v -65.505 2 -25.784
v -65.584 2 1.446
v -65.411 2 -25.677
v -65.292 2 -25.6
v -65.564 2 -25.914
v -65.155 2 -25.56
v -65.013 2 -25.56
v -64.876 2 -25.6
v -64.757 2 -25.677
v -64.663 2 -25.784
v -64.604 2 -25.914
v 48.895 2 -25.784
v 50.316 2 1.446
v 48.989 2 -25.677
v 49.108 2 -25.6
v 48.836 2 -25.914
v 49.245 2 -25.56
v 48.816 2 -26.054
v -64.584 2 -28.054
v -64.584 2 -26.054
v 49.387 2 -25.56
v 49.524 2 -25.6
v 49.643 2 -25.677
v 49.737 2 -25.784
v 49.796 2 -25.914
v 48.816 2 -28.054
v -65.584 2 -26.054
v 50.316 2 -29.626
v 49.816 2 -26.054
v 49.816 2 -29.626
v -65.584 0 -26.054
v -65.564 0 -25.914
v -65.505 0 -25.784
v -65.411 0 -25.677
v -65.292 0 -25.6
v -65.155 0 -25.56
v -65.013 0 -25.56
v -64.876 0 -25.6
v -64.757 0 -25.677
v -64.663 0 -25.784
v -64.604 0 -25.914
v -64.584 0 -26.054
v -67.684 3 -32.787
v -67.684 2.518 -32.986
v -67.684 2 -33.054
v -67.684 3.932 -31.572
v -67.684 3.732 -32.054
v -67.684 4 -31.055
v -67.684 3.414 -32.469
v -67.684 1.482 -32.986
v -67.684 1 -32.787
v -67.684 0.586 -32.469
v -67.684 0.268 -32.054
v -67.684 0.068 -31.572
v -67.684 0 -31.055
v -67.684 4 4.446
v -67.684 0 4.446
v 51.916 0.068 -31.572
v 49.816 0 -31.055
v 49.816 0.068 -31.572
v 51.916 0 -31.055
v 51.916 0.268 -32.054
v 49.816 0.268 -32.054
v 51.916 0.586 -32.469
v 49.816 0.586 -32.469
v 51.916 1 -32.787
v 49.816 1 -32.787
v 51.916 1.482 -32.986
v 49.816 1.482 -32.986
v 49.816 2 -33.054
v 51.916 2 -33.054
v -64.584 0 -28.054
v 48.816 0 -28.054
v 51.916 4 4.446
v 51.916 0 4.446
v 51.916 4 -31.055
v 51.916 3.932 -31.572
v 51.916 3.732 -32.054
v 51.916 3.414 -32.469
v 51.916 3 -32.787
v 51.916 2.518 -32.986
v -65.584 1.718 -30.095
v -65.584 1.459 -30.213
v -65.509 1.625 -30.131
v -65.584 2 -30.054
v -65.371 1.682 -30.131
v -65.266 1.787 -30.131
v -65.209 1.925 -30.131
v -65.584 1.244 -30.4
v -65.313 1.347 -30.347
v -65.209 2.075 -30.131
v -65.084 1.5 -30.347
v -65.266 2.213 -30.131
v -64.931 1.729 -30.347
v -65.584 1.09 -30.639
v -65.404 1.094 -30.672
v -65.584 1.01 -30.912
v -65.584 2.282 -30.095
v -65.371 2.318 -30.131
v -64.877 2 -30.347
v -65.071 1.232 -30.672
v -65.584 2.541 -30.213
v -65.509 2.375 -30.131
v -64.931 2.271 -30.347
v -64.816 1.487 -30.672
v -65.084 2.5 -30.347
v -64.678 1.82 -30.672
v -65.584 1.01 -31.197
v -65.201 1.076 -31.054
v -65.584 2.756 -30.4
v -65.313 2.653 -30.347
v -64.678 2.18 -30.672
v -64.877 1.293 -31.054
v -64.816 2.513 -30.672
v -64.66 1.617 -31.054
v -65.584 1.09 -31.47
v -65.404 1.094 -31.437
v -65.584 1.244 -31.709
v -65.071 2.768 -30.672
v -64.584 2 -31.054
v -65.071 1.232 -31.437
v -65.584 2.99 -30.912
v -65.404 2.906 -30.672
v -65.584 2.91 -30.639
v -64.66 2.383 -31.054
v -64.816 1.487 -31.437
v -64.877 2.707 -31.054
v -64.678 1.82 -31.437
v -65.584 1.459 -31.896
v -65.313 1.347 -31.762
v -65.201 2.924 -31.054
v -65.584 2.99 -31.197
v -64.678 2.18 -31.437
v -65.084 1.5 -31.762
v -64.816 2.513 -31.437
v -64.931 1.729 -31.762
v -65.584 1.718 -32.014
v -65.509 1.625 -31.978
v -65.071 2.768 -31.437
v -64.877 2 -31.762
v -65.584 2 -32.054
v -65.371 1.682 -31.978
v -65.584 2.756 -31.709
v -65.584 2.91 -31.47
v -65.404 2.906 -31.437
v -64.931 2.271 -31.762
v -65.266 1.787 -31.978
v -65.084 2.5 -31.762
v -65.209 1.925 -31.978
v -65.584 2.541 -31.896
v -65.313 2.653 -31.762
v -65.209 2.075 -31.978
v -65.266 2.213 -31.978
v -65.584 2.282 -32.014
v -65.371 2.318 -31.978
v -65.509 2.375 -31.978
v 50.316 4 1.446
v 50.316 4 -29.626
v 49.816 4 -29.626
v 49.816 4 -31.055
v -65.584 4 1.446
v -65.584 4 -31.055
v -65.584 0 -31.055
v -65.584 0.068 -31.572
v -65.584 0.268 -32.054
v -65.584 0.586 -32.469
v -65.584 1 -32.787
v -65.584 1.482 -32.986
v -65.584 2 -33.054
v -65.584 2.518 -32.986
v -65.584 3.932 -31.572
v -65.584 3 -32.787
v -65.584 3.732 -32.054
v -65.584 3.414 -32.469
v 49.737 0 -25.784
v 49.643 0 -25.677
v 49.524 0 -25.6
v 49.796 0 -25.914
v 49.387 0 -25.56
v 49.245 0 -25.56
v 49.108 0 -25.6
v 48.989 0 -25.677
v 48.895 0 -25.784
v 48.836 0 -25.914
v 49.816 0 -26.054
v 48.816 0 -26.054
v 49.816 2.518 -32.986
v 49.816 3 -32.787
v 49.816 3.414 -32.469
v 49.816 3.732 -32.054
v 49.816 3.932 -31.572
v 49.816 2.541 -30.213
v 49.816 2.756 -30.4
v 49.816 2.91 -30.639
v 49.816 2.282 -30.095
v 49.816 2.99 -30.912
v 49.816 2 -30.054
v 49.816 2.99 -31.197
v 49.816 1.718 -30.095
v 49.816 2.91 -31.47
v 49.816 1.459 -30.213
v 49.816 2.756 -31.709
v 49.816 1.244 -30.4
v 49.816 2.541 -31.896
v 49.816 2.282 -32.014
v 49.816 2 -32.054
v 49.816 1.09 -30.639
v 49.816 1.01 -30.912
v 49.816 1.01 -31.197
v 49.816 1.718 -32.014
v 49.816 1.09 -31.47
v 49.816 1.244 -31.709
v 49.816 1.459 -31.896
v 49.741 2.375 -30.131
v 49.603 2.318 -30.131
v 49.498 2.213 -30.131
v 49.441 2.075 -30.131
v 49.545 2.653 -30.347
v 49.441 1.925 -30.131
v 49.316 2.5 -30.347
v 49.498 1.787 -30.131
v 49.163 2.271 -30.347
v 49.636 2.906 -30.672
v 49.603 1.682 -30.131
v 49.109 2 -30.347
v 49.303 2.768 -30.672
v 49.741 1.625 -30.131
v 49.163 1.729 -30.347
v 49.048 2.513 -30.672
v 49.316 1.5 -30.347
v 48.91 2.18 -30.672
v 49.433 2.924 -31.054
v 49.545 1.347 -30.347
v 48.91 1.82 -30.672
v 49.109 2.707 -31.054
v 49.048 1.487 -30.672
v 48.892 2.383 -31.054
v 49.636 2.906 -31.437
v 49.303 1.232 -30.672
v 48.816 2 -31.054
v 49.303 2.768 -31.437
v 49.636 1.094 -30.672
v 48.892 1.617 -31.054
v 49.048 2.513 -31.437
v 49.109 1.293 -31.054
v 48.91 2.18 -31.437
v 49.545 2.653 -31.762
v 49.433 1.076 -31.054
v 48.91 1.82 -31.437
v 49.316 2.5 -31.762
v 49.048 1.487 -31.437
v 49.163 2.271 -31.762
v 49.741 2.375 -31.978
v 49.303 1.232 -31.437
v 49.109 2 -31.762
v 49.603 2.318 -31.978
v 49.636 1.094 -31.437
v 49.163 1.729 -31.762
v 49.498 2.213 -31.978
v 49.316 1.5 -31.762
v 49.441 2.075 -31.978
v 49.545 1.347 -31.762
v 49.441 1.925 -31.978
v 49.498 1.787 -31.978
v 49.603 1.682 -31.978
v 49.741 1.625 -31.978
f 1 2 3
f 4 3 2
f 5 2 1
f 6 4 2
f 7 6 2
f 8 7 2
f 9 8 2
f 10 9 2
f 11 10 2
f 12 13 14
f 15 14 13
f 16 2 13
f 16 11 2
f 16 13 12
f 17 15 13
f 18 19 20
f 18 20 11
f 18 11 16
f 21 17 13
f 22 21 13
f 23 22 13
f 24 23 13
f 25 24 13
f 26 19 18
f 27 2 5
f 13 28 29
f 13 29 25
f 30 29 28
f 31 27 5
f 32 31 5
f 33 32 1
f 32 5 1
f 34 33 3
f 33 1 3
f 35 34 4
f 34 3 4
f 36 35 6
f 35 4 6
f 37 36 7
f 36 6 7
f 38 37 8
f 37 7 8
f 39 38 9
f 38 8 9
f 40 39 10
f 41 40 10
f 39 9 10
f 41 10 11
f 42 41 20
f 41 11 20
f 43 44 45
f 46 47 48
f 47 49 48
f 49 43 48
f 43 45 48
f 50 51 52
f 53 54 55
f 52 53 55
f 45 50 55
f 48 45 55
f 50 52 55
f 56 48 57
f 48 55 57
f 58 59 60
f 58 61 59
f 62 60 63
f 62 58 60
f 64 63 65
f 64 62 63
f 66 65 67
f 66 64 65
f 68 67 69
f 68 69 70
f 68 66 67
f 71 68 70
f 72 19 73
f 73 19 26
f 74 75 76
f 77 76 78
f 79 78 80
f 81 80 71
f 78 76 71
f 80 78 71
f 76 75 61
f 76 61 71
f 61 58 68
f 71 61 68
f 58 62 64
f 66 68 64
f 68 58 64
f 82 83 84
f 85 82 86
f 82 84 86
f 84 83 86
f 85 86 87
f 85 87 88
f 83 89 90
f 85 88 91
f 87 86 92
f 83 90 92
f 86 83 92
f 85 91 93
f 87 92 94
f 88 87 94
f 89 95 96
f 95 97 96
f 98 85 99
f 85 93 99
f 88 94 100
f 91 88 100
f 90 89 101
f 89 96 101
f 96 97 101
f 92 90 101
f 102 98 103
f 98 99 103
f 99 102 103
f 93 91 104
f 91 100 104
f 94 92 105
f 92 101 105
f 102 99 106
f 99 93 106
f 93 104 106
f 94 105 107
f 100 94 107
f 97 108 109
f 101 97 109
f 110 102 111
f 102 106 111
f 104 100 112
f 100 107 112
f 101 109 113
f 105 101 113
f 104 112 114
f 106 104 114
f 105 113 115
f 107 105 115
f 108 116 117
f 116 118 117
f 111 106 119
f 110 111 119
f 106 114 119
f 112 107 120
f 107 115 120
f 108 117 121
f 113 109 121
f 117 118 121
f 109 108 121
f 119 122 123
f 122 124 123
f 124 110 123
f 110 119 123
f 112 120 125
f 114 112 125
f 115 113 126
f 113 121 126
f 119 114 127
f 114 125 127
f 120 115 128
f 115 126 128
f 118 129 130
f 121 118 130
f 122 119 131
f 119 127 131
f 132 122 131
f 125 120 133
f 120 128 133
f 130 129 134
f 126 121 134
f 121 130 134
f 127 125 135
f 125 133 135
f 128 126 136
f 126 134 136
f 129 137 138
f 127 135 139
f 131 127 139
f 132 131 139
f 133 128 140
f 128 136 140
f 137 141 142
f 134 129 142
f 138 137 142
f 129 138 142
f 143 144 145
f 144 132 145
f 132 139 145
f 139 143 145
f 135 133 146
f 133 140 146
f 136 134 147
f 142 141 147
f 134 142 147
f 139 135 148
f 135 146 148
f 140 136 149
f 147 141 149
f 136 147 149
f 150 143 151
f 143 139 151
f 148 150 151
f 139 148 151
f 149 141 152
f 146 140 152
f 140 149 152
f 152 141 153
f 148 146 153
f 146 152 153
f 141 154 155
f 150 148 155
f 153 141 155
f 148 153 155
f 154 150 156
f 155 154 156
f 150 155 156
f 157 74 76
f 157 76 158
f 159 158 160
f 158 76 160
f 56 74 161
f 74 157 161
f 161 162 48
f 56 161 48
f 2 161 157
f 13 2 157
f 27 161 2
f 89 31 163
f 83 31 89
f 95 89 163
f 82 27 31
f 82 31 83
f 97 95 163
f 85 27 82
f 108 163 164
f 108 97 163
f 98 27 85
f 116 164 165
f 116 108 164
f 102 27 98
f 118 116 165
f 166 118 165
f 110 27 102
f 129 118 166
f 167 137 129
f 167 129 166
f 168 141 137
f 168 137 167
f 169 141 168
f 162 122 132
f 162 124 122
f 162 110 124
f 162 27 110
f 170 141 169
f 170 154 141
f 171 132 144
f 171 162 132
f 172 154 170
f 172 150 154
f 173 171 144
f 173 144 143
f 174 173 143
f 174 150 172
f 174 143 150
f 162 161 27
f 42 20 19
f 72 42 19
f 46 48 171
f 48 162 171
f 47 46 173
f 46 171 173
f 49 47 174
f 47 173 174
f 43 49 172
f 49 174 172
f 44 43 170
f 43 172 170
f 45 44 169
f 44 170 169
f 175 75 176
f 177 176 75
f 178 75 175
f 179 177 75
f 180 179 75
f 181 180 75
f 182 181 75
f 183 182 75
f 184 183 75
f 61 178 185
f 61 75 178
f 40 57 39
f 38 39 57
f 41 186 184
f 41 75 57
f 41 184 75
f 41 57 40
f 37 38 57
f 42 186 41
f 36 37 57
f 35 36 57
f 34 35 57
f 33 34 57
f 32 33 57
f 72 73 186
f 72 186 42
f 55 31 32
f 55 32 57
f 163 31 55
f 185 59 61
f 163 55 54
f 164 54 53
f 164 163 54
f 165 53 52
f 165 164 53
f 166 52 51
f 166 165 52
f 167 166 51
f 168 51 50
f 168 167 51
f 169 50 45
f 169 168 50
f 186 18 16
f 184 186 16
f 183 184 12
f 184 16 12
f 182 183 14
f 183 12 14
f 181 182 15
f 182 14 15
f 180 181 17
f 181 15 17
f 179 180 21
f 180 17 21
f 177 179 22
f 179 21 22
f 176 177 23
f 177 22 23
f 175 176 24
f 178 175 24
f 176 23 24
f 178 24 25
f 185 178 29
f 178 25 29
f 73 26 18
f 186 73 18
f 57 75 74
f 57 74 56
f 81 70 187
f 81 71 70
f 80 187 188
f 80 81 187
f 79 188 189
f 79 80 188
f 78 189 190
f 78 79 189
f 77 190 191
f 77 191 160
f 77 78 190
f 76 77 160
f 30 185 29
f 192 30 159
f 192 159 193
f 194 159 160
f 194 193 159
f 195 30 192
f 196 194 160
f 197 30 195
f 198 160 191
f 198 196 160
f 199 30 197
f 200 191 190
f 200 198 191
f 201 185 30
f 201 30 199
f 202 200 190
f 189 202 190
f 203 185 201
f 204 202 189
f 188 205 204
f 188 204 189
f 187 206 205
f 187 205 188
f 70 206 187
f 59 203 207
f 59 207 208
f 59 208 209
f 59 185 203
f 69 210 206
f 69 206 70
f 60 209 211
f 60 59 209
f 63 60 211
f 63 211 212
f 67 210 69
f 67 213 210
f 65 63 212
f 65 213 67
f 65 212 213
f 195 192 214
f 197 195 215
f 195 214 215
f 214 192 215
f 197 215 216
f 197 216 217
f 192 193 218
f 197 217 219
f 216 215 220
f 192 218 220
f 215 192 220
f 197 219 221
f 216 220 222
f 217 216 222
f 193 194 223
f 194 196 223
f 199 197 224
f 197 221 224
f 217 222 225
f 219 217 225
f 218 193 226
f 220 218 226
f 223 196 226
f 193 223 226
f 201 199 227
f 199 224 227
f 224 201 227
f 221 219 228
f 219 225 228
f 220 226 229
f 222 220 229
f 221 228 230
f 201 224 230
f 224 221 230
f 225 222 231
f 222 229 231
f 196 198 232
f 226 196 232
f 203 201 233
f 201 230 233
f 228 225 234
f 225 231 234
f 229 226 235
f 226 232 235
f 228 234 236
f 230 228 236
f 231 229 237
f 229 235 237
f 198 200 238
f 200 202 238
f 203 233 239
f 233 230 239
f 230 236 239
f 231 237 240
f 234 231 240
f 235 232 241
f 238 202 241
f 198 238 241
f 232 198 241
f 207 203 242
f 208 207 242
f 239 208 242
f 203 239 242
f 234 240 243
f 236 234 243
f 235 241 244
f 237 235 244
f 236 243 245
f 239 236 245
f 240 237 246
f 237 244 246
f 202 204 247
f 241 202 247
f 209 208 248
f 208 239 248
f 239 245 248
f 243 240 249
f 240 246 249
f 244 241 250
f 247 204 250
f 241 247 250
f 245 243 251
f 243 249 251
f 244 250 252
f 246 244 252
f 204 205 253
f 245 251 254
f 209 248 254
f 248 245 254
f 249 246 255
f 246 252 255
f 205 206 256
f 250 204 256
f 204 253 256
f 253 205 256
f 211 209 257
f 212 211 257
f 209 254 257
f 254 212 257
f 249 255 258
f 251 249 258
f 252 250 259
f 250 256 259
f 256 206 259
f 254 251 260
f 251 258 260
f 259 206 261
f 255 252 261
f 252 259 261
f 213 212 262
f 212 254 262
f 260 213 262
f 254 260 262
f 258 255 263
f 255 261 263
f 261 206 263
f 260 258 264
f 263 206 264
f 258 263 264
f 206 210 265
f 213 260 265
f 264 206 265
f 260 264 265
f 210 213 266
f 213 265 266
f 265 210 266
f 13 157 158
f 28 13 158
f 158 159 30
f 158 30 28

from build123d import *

# Parameters (mm, degrees)
SALIENTE_EXTRUIR1_DEPTH = 4
CROQUIS4_W              = 113.4
CROQUIS4_H              = 2
CORTAR_EXTRUIR1_DEPTH   = 10
REDONDEO1_R             = 2
CROQUIS5_W              = 115.9
CROQUIS5_H              = 31.071267716
CORTAR_EXTRUIR2_DEPTH   = 2


with BuildPart() as part:
    # Croquis1 → Saliente-Extruir1 (new body)
    with BuildSketch(Plane(origin=(0, 0, 0), x_dir=(1, 0, 0), z_dir=(0, 1, 0))):
        Polygon((-65.583943666, 30.054443615), (49.816056334, 30.054443615), (49.816056334, 33.054443615), (51.916056334, 33.054443615), (51.916056334, 30.054443615), (51.916056334, -4.445556385), (-67.683943666, -4.445556385), (-67.683943666, 30.054443615), (-67.683943666, 33.054443615), (-65.583943666, 33.054443615), align=None)
    extrude(amount=SALIENTE_EXTRUIR1_DEPTH)

    # Croquis4 → Cortar-Extruir1 (cut)
    with BuildSketch(Plane(origin=(0, 4, 0), x_dir=(1, 0, 0), z_dir=(0, 1, 0))):
        with Locations((-7.883943666, 29.054443615)):
            Rectangle(CROQUIS4_W, CROQUIS4_H)
        with BuildLine():
            Line((49.816056334, 26.054443615), (49.816056334, 30.054443615))
            Line((49.816056334, 30.054443615), (48.816056334, 30.054443615))
            Line((48.816056334, 30.054443615), (48.816056334, 28.054443615))
            Line((48.816056334, 28.054443615), (48.816056334, 26.054443615))
            ThreePointArc((48.816056334, 26.054443615), (49.316056334, 25.554443615), (49.816056334, 26.054443615))
        make_face()
        with BuildLine():
            Line((-64.583943666, 28.054443615), (-64.583943666, 30.054443615))
            Line((-64.583943666, 30.054443615), (-65.583943666, 30.054443615))
            Line((-65.583943666, 30.054443615), (-65.583943666, 26.054443615))
            ThreePointArc((-65.583943666, 26.054443615), (-65.083943666, 25.554443615), (-64.583943666, 26.054443615))
            Line((-64.583943666, 26.054443615), (-64.583943666, 28.054443615))
        make_face()
    extrude(amount=-CORTAR_EXTRUIR1_DEPTH, mode=Mode.SUBTRACT)

    # Redondeo1
    redondeo1_edges = [part.edges().sort_by_distance(p)[0] for p in [
        (-66.633943666, 0, -33.054443615),
        (-66.633943666, 4, -33.054443615),
        (50.866056334, 0, -33.054443615),
        (50.866056334, 4, -33.054443615),
    ]]
    fillet(redondeo1_edges, radius=REDONDEO1_R - 0.0001)  # a hair under: the kernel refuses the full size

    # Croquis3 → Revolución1 (revolve)
    with BuildSketch(Plane(origin=(-65.583943666, 0, 0), x_dir=(0, 0, -1), z_dir=(1, 0, 0))):
        with BuildLine():
            Line((32.054443615, 2), (30.054443615, 2))
            ThreePointArc((30.054443615, 2), (31.054443615, 1), (32.054443615, 2))
        make_face()
    revolve(axis=Axis((-65.583943666, 2, -32.054443615), (0, 0, 1)))

    # Croquis2 → Revolución2 (revolve)
    with BuildSketch(Plane.ZY.offset(-49.816056334)):
        with BuildLine():
            Line((-32.054443615, 2), (-30.054443615, 2))
            ThreePointArc((-30.054443615, 2), (-31.054443615, 1), (-32.054443615, 2))
        make_face()
    revolve(axis=Axis((49.816056334, 2, -32.054443615), (0, 0, 1)))

    # Croquis5 → Cortar-Extruir2 (cut)
    with BuildSketch(Plane(origin=(0, 4, 0), x_dir=(1, 0, 0), z_dir=(0, 1, 0))):
        with Locations((-7.633943666, 14.090077473)):
            Rectangle(CROQUIS5_W, CROQUIS5_H)
    extrude(amount=-CORTAR_EXTRUIR2_DEPTH, mode=Mode.SUBTRACT)


solid = part.part
